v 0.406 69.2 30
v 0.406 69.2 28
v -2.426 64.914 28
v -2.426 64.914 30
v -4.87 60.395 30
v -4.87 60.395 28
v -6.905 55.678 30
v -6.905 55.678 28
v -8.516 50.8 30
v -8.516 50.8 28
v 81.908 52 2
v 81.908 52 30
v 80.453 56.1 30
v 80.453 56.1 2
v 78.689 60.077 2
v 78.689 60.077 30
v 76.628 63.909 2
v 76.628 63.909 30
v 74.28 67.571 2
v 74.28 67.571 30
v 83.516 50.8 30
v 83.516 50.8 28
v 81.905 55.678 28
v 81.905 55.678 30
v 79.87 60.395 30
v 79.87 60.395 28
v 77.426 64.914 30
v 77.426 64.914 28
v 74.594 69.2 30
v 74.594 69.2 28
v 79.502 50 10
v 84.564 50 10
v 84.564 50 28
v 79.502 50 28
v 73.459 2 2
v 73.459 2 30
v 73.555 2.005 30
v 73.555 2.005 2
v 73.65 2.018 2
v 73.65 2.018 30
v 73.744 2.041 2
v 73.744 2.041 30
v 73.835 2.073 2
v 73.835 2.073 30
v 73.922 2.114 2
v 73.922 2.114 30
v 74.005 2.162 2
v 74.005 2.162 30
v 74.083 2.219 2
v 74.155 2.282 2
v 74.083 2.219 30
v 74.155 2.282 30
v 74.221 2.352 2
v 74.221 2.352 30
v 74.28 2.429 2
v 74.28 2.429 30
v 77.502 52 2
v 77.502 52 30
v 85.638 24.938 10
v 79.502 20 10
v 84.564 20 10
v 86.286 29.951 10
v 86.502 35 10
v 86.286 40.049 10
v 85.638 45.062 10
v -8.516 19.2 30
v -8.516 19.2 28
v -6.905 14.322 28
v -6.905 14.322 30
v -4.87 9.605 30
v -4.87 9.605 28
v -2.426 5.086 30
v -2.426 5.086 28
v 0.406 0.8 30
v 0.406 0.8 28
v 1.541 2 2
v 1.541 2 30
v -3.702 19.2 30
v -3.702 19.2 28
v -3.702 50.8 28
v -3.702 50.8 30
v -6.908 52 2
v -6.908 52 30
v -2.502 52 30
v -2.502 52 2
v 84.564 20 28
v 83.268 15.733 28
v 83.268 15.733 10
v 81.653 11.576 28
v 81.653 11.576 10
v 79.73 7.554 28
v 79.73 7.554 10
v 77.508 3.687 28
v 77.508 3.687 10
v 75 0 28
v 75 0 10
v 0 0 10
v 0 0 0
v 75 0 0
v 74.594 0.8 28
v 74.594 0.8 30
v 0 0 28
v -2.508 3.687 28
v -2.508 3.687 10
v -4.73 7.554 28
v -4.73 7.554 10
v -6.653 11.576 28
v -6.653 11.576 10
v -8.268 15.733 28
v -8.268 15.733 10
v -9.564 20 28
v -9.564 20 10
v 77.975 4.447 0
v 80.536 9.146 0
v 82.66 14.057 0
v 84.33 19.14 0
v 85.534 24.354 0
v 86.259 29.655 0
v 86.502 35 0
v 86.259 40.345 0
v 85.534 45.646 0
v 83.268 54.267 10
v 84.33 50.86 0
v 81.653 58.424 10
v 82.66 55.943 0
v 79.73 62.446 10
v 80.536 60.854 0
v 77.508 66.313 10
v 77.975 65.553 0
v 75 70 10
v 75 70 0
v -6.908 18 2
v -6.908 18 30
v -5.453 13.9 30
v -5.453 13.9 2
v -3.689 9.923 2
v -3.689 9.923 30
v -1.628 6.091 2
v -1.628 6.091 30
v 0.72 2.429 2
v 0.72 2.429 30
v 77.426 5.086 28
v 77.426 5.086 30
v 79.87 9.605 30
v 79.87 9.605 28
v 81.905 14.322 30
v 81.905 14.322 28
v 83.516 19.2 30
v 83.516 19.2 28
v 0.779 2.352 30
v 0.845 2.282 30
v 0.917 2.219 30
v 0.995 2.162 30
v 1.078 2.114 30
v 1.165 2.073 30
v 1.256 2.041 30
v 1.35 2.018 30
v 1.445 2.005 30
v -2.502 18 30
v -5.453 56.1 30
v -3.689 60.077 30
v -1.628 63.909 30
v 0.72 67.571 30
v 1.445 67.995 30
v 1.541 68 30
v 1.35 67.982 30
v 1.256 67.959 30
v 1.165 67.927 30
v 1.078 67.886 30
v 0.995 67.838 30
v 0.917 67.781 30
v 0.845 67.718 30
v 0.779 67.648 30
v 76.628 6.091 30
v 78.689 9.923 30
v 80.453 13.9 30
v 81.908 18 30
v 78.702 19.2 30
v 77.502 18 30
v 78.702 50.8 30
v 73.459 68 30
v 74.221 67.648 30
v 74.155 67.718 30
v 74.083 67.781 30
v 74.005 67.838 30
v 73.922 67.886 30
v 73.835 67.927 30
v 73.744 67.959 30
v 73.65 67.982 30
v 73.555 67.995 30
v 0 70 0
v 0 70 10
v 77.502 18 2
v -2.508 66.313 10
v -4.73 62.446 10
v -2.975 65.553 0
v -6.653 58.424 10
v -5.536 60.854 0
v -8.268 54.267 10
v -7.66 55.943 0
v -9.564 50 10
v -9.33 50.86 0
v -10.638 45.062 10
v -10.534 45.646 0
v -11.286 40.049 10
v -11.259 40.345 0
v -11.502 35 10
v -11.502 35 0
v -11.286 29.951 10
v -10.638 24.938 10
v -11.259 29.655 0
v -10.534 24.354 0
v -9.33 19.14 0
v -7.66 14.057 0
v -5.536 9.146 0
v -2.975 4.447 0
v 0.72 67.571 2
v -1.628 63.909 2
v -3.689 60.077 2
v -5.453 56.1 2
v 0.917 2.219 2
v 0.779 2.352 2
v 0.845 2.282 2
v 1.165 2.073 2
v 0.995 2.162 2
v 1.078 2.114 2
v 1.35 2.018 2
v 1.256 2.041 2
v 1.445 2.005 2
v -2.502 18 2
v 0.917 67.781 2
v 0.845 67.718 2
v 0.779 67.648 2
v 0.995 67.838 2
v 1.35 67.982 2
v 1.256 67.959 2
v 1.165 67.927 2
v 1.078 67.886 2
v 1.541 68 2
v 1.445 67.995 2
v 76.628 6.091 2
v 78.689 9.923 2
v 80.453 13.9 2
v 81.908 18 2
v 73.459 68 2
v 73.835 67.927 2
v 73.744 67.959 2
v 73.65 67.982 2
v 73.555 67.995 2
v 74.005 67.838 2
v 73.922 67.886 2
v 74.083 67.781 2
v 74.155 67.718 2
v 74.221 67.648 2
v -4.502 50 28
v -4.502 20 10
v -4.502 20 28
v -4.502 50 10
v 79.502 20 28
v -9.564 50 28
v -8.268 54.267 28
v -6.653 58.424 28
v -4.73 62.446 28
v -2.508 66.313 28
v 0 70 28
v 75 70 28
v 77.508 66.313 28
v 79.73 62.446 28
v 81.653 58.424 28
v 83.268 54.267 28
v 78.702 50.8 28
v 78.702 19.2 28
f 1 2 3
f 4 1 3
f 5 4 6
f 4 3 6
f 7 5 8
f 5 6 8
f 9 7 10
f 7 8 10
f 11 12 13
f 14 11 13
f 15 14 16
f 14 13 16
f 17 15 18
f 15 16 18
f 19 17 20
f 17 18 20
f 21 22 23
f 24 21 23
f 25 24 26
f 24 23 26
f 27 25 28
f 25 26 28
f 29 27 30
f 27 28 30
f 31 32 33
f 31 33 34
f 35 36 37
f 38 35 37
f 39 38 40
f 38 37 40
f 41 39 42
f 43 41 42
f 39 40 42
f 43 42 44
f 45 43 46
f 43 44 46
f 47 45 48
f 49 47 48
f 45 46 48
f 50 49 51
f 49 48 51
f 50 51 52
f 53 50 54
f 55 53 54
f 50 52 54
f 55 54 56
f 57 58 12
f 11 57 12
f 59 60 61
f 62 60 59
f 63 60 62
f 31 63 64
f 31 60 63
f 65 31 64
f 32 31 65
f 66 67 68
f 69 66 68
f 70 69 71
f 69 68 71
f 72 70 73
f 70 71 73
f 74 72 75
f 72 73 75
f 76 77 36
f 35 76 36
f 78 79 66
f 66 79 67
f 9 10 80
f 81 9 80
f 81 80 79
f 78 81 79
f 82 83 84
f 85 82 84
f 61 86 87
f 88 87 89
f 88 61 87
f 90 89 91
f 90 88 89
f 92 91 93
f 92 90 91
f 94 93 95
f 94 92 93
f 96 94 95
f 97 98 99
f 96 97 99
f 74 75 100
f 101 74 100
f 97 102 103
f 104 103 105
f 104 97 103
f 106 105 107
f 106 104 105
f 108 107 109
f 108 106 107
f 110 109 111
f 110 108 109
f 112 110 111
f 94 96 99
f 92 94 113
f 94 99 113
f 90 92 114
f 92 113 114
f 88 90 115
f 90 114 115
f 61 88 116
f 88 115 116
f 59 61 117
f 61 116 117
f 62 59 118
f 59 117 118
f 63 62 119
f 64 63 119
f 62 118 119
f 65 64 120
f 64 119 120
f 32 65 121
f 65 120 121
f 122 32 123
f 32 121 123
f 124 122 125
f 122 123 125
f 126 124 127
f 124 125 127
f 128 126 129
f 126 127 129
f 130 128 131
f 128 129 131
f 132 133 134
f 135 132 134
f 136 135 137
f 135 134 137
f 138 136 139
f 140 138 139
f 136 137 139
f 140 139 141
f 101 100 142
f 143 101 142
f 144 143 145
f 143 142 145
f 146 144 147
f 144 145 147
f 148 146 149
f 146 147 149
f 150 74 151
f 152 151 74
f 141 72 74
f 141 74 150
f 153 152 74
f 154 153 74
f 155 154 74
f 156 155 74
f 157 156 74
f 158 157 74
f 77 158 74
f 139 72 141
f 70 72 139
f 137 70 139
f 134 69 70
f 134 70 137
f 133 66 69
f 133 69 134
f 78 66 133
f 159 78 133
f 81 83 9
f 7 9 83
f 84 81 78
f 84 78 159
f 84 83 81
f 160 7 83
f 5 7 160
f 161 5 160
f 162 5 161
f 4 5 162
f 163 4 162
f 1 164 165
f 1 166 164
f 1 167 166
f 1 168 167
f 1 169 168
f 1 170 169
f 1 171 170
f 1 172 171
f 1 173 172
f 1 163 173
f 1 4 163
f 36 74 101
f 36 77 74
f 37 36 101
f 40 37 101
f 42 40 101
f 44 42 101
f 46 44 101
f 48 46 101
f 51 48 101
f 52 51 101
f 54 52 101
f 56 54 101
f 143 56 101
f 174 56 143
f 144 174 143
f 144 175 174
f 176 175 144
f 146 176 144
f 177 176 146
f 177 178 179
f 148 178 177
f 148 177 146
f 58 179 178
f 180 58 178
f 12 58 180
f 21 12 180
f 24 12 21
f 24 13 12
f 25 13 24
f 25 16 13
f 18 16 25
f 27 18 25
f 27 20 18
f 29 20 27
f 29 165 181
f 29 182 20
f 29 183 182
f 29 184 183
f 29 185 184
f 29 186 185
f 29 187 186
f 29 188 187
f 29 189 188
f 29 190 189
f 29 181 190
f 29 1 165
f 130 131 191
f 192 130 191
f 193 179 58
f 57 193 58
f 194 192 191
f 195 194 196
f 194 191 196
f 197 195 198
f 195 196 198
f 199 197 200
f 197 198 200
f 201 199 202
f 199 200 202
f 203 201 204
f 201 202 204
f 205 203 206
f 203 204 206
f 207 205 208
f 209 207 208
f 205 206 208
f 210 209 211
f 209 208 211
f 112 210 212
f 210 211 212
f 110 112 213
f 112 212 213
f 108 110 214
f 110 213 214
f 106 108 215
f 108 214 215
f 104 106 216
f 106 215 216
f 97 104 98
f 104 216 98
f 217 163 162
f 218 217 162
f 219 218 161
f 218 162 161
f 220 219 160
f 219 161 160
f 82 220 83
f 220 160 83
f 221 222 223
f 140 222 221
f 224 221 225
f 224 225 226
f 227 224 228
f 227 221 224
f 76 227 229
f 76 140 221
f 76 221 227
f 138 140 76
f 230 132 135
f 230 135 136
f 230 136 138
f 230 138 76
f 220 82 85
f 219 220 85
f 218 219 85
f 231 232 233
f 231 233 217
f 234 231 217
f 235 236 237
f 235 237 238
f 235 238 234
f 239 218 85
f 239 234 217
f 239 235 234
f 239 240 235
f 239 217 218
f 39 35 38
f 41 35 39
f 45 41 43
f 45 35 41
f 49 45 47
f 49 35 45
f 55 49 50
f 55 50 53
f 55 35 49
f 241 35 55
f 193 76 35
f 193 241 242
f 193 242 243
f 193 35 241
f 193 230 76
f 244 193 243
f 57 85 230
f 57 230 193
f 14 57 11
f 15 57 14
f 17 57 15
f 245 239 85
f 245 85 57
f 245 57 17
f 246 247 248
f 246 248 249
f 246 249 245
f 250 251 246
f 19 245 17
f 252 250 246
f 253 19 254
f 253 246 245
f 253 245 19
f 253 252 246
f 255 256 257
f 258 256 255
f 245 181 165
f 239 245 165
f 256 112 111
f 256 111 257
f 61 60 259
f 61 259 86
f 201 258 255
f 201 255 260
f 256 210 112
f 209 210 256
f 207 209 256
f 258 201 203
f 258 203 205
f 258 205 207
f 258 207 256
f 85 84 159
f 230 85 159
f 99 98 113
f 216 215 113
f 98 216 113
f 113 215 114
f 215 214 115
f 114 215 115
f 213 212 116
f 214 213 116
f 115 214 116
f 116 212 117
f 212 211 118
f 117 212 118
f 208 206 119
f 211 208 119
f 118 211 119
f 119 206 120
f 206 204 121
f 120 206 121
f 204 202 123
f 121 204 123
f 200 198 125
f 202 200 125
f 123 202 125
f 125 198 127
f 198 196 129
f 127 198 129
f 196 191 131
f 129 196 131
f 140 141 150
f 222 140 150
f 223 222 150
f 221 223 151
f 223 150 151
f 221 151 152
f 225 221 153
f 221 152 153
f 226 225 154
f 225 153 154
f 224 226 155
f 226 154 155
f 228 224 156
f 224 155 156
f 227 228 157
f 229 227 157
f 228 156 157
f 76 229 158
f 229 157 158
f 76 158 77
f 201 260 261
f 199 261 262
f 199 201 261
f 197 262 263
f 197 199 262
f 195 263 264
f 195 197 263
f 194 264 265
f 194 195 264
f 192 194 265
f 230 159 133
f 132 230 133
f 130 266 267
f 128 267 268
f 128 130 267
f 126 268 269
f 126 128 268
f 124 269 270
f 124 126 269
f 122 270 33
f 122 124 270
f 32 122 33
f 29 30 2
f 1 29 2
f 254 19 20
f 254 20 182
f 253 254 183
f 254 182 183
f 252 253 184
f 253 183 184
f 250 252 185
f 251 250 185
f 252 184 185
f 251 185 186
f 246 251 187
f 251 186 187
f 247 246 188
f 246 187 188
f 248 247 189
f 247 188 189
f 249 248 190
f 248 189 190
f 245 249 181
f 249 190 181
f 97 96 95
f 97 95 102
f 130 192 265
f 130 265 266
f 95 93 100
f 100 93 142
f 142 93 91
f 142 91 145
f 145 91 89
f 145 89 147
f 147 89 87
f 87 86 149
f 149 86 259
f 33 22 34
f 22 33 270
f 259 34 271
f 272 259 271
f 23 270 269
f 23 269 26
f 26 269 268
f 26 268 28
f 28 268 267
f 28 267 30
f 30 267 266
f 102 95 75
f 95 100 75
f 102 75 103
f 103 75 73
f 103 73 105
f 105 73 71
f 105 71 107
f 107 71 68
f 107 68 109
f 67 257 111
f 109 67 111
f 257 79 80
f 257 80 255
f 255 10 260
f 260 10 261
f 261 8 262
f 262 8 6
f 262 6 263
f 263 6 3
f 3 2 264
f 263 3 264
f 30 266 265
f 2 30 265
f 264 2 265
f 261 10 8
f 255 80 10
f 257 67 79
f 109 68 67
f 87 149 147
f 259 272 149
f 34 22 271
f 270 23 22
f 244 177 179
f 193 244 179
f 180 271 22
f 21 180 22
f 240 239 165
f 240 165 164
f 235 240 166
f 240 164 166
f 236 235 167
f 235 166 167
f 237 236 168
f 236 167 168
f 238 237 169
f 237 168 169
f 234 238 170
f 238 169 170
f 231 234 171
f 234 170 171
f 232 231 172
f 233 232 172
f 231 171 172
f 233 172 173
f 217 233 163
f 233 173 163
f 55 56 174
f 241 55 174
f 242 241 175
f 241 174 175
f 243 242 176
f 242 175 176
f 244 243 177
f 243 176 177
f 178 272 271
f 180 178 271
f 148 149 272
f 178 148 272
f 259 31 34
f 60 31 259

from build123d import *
from build123d.topology import SkipClean

# Parameters (mm, degrees)
BOSS_EXTRUDE4_DEPTH  = 10
BOSS_EXTRUDE10_DEPTH = 18
BOSS_EXTRUDE11_DEPTH = 2
CUT_EXTRUDE8_DEPTH   = 28


with BuildPart() as part:
    # Sketch1 → Boss-Extrude4 (new body)
    with BuildSketch(Plane.XY):
        with BuildLine():
            Line((0, 0), (75, 0))
            ThreePointArc((75, 0), (86.502118606, 35), (75, 70))
            Line((75, 70), (0, 70))
            ThreePointArc((0, 70), (-11.502118606, 35), (0, 0))
        make_face()
    extrude(amount=BOSS_EXTRUDE4_DEPTH)

    # Sketch4 → Boss-Extrude10 (add)
    with SkipClean():  # the faces are left unmerged after this step: merging them gives an invalid solid
        with BuildSketch(Plane.XY.offset(10)):
            with BuildLine():
                Line((79.502118606, 20), (84.563561053, 20))
                ThreePointArc((84.563561053, 20), (80.729546072, 9.546799317), (75, 0))
                Line((75, 0), (0, 0))
                ThreePointArc((0, 0), (-5.729546072, 9.546799317), (-9.563561053, 20))
                Line((-9.563561053, 20), (-4.502118606, 20))
                Line((-4.502118606, 20), (-4.502118606, 50))
                Line((-4.502118606, 50), (-9.563561053, 50))
                ThreePointArc((-9.563561053, 50), (-5.729546072, 60.453200683), (0, 70))
                Line((0, 70), (75, 70))
                ThreePointArc((75, 70), (80.729546072, 60.453200683), (84.563561053, 50))
                Line((84.563561053, 50), (79.502118606, 50))
                Line((79.502118606, 50), (79.502118606, 20))
            make_face()
        extrude(amount=BOSS_EXTRUDE10_DEPTH)

    # Sketch9 → Boss-Extrude11 (add)
    with SkipClean():  # the faces are left unmerged after this step: merging them gives an invalid solid
        with BuildSketch(Plane.XY.offset(28)):
            with BuildLine():
                Line((-8.516485165, 50.8), (-3.702118606, 50.8))
                Line((-3.702118606, 50.8), (-3.702118606, 19.2))
                Line((-3.702118606, 19.2), (-8.516485165, 19.2))
                ThreePointArc((-8.516485165, 19.2), (-4.869685973, 9.605067408), (0.405981163, 0.8))
                Line((0.405981163, 0.8), (74.594018837, 0.8))
                ThreePointArc((74.594018837, 0.8), (79.869685973, 9.605067408), (83.516485165, 19.2))
                Line((83.516485165, 19.2), (78.702118606, 19.2))
                Line((78.702118606, 19.2), (78.702118606, 50.8))
                Line((78.702118606, 50.8), (83.516485165, 50.8))
                ThreePointArc((83.516485165, 50.8), (79.869685973, 60.394932592), (74.594018837, 69.2))
                Line((74.594018837, 69.2), (0.405981163, 69.2))
                ThreePointArc((0.405981163, 69.2), (-4.869685973, 60.394932592), (-8.516485165, 50.8))
            make_face()
        extrude(amount=BOSS_EXTRUDE11_DEPTH)

    # Sketch10 → Cut-Extrude8 (cut)
    with SkipClean():  # the faces are left unmerged after this step: merging them gives an invalid solid
        with BuildSketch(Plane.XY.offset(30)):
            with BuildLine():
                Line((-6.908101654, 52), (-2.502118606, 52))
                Line((-2.502118606, 52), (-2.502118606, 18))
                Line((-2.502118606, 18), (-6.908101654, 18))
                ThreePointArc((-6.908101654, 18), (-3.68947636, 9.922539293), (0.720250379, 2.428593046))
                ThreePointArc((0.720250379, 2.428593046), (1.077995513, 2.113600837), (1.540917238, 2))
                Line((1.540917238, 2), (73.459082762, 2))
                ThreePointArc((73.459082762, 2), (73.922004487, 2.113600837), (74.279749621, 2.428593046))
                ThreePointArc((74.279749621, 2.428593046), (78.68947636, 9.922539293), (81.908101654, 18))
                Line((81.908101654, 18), (77.502118606, 18))
                Line((77.502118606, 18), (77.502118606, 52))
                Line((77.502118606, 52), (81.908101654, 52))
                ThreePointArc((81.908101654, 52), (78.68947636, 60.077460707), (74.279749621, 67.571406954))
                ThreePointArc((74.279749621, 67.571406954), (73.922004487, 67.886399163), (73.459082762, 68))
                Line((73.459082762, 68), (1.540917238, 68))
                ThreePointArc((1.540917238, 68), (1.077995513, 67.886399163), (0.720250379, 67.571406954))
                ThreePointArc((0.720250379, 67.571406954), (-3.68947636, 60.077460707), (-6.908101654, 52))
            make_face()
        extrude(amount=-CUT_EXTRUDE8_DEPTH, mode=Mode.SUBTRACT)


solid = part.part
